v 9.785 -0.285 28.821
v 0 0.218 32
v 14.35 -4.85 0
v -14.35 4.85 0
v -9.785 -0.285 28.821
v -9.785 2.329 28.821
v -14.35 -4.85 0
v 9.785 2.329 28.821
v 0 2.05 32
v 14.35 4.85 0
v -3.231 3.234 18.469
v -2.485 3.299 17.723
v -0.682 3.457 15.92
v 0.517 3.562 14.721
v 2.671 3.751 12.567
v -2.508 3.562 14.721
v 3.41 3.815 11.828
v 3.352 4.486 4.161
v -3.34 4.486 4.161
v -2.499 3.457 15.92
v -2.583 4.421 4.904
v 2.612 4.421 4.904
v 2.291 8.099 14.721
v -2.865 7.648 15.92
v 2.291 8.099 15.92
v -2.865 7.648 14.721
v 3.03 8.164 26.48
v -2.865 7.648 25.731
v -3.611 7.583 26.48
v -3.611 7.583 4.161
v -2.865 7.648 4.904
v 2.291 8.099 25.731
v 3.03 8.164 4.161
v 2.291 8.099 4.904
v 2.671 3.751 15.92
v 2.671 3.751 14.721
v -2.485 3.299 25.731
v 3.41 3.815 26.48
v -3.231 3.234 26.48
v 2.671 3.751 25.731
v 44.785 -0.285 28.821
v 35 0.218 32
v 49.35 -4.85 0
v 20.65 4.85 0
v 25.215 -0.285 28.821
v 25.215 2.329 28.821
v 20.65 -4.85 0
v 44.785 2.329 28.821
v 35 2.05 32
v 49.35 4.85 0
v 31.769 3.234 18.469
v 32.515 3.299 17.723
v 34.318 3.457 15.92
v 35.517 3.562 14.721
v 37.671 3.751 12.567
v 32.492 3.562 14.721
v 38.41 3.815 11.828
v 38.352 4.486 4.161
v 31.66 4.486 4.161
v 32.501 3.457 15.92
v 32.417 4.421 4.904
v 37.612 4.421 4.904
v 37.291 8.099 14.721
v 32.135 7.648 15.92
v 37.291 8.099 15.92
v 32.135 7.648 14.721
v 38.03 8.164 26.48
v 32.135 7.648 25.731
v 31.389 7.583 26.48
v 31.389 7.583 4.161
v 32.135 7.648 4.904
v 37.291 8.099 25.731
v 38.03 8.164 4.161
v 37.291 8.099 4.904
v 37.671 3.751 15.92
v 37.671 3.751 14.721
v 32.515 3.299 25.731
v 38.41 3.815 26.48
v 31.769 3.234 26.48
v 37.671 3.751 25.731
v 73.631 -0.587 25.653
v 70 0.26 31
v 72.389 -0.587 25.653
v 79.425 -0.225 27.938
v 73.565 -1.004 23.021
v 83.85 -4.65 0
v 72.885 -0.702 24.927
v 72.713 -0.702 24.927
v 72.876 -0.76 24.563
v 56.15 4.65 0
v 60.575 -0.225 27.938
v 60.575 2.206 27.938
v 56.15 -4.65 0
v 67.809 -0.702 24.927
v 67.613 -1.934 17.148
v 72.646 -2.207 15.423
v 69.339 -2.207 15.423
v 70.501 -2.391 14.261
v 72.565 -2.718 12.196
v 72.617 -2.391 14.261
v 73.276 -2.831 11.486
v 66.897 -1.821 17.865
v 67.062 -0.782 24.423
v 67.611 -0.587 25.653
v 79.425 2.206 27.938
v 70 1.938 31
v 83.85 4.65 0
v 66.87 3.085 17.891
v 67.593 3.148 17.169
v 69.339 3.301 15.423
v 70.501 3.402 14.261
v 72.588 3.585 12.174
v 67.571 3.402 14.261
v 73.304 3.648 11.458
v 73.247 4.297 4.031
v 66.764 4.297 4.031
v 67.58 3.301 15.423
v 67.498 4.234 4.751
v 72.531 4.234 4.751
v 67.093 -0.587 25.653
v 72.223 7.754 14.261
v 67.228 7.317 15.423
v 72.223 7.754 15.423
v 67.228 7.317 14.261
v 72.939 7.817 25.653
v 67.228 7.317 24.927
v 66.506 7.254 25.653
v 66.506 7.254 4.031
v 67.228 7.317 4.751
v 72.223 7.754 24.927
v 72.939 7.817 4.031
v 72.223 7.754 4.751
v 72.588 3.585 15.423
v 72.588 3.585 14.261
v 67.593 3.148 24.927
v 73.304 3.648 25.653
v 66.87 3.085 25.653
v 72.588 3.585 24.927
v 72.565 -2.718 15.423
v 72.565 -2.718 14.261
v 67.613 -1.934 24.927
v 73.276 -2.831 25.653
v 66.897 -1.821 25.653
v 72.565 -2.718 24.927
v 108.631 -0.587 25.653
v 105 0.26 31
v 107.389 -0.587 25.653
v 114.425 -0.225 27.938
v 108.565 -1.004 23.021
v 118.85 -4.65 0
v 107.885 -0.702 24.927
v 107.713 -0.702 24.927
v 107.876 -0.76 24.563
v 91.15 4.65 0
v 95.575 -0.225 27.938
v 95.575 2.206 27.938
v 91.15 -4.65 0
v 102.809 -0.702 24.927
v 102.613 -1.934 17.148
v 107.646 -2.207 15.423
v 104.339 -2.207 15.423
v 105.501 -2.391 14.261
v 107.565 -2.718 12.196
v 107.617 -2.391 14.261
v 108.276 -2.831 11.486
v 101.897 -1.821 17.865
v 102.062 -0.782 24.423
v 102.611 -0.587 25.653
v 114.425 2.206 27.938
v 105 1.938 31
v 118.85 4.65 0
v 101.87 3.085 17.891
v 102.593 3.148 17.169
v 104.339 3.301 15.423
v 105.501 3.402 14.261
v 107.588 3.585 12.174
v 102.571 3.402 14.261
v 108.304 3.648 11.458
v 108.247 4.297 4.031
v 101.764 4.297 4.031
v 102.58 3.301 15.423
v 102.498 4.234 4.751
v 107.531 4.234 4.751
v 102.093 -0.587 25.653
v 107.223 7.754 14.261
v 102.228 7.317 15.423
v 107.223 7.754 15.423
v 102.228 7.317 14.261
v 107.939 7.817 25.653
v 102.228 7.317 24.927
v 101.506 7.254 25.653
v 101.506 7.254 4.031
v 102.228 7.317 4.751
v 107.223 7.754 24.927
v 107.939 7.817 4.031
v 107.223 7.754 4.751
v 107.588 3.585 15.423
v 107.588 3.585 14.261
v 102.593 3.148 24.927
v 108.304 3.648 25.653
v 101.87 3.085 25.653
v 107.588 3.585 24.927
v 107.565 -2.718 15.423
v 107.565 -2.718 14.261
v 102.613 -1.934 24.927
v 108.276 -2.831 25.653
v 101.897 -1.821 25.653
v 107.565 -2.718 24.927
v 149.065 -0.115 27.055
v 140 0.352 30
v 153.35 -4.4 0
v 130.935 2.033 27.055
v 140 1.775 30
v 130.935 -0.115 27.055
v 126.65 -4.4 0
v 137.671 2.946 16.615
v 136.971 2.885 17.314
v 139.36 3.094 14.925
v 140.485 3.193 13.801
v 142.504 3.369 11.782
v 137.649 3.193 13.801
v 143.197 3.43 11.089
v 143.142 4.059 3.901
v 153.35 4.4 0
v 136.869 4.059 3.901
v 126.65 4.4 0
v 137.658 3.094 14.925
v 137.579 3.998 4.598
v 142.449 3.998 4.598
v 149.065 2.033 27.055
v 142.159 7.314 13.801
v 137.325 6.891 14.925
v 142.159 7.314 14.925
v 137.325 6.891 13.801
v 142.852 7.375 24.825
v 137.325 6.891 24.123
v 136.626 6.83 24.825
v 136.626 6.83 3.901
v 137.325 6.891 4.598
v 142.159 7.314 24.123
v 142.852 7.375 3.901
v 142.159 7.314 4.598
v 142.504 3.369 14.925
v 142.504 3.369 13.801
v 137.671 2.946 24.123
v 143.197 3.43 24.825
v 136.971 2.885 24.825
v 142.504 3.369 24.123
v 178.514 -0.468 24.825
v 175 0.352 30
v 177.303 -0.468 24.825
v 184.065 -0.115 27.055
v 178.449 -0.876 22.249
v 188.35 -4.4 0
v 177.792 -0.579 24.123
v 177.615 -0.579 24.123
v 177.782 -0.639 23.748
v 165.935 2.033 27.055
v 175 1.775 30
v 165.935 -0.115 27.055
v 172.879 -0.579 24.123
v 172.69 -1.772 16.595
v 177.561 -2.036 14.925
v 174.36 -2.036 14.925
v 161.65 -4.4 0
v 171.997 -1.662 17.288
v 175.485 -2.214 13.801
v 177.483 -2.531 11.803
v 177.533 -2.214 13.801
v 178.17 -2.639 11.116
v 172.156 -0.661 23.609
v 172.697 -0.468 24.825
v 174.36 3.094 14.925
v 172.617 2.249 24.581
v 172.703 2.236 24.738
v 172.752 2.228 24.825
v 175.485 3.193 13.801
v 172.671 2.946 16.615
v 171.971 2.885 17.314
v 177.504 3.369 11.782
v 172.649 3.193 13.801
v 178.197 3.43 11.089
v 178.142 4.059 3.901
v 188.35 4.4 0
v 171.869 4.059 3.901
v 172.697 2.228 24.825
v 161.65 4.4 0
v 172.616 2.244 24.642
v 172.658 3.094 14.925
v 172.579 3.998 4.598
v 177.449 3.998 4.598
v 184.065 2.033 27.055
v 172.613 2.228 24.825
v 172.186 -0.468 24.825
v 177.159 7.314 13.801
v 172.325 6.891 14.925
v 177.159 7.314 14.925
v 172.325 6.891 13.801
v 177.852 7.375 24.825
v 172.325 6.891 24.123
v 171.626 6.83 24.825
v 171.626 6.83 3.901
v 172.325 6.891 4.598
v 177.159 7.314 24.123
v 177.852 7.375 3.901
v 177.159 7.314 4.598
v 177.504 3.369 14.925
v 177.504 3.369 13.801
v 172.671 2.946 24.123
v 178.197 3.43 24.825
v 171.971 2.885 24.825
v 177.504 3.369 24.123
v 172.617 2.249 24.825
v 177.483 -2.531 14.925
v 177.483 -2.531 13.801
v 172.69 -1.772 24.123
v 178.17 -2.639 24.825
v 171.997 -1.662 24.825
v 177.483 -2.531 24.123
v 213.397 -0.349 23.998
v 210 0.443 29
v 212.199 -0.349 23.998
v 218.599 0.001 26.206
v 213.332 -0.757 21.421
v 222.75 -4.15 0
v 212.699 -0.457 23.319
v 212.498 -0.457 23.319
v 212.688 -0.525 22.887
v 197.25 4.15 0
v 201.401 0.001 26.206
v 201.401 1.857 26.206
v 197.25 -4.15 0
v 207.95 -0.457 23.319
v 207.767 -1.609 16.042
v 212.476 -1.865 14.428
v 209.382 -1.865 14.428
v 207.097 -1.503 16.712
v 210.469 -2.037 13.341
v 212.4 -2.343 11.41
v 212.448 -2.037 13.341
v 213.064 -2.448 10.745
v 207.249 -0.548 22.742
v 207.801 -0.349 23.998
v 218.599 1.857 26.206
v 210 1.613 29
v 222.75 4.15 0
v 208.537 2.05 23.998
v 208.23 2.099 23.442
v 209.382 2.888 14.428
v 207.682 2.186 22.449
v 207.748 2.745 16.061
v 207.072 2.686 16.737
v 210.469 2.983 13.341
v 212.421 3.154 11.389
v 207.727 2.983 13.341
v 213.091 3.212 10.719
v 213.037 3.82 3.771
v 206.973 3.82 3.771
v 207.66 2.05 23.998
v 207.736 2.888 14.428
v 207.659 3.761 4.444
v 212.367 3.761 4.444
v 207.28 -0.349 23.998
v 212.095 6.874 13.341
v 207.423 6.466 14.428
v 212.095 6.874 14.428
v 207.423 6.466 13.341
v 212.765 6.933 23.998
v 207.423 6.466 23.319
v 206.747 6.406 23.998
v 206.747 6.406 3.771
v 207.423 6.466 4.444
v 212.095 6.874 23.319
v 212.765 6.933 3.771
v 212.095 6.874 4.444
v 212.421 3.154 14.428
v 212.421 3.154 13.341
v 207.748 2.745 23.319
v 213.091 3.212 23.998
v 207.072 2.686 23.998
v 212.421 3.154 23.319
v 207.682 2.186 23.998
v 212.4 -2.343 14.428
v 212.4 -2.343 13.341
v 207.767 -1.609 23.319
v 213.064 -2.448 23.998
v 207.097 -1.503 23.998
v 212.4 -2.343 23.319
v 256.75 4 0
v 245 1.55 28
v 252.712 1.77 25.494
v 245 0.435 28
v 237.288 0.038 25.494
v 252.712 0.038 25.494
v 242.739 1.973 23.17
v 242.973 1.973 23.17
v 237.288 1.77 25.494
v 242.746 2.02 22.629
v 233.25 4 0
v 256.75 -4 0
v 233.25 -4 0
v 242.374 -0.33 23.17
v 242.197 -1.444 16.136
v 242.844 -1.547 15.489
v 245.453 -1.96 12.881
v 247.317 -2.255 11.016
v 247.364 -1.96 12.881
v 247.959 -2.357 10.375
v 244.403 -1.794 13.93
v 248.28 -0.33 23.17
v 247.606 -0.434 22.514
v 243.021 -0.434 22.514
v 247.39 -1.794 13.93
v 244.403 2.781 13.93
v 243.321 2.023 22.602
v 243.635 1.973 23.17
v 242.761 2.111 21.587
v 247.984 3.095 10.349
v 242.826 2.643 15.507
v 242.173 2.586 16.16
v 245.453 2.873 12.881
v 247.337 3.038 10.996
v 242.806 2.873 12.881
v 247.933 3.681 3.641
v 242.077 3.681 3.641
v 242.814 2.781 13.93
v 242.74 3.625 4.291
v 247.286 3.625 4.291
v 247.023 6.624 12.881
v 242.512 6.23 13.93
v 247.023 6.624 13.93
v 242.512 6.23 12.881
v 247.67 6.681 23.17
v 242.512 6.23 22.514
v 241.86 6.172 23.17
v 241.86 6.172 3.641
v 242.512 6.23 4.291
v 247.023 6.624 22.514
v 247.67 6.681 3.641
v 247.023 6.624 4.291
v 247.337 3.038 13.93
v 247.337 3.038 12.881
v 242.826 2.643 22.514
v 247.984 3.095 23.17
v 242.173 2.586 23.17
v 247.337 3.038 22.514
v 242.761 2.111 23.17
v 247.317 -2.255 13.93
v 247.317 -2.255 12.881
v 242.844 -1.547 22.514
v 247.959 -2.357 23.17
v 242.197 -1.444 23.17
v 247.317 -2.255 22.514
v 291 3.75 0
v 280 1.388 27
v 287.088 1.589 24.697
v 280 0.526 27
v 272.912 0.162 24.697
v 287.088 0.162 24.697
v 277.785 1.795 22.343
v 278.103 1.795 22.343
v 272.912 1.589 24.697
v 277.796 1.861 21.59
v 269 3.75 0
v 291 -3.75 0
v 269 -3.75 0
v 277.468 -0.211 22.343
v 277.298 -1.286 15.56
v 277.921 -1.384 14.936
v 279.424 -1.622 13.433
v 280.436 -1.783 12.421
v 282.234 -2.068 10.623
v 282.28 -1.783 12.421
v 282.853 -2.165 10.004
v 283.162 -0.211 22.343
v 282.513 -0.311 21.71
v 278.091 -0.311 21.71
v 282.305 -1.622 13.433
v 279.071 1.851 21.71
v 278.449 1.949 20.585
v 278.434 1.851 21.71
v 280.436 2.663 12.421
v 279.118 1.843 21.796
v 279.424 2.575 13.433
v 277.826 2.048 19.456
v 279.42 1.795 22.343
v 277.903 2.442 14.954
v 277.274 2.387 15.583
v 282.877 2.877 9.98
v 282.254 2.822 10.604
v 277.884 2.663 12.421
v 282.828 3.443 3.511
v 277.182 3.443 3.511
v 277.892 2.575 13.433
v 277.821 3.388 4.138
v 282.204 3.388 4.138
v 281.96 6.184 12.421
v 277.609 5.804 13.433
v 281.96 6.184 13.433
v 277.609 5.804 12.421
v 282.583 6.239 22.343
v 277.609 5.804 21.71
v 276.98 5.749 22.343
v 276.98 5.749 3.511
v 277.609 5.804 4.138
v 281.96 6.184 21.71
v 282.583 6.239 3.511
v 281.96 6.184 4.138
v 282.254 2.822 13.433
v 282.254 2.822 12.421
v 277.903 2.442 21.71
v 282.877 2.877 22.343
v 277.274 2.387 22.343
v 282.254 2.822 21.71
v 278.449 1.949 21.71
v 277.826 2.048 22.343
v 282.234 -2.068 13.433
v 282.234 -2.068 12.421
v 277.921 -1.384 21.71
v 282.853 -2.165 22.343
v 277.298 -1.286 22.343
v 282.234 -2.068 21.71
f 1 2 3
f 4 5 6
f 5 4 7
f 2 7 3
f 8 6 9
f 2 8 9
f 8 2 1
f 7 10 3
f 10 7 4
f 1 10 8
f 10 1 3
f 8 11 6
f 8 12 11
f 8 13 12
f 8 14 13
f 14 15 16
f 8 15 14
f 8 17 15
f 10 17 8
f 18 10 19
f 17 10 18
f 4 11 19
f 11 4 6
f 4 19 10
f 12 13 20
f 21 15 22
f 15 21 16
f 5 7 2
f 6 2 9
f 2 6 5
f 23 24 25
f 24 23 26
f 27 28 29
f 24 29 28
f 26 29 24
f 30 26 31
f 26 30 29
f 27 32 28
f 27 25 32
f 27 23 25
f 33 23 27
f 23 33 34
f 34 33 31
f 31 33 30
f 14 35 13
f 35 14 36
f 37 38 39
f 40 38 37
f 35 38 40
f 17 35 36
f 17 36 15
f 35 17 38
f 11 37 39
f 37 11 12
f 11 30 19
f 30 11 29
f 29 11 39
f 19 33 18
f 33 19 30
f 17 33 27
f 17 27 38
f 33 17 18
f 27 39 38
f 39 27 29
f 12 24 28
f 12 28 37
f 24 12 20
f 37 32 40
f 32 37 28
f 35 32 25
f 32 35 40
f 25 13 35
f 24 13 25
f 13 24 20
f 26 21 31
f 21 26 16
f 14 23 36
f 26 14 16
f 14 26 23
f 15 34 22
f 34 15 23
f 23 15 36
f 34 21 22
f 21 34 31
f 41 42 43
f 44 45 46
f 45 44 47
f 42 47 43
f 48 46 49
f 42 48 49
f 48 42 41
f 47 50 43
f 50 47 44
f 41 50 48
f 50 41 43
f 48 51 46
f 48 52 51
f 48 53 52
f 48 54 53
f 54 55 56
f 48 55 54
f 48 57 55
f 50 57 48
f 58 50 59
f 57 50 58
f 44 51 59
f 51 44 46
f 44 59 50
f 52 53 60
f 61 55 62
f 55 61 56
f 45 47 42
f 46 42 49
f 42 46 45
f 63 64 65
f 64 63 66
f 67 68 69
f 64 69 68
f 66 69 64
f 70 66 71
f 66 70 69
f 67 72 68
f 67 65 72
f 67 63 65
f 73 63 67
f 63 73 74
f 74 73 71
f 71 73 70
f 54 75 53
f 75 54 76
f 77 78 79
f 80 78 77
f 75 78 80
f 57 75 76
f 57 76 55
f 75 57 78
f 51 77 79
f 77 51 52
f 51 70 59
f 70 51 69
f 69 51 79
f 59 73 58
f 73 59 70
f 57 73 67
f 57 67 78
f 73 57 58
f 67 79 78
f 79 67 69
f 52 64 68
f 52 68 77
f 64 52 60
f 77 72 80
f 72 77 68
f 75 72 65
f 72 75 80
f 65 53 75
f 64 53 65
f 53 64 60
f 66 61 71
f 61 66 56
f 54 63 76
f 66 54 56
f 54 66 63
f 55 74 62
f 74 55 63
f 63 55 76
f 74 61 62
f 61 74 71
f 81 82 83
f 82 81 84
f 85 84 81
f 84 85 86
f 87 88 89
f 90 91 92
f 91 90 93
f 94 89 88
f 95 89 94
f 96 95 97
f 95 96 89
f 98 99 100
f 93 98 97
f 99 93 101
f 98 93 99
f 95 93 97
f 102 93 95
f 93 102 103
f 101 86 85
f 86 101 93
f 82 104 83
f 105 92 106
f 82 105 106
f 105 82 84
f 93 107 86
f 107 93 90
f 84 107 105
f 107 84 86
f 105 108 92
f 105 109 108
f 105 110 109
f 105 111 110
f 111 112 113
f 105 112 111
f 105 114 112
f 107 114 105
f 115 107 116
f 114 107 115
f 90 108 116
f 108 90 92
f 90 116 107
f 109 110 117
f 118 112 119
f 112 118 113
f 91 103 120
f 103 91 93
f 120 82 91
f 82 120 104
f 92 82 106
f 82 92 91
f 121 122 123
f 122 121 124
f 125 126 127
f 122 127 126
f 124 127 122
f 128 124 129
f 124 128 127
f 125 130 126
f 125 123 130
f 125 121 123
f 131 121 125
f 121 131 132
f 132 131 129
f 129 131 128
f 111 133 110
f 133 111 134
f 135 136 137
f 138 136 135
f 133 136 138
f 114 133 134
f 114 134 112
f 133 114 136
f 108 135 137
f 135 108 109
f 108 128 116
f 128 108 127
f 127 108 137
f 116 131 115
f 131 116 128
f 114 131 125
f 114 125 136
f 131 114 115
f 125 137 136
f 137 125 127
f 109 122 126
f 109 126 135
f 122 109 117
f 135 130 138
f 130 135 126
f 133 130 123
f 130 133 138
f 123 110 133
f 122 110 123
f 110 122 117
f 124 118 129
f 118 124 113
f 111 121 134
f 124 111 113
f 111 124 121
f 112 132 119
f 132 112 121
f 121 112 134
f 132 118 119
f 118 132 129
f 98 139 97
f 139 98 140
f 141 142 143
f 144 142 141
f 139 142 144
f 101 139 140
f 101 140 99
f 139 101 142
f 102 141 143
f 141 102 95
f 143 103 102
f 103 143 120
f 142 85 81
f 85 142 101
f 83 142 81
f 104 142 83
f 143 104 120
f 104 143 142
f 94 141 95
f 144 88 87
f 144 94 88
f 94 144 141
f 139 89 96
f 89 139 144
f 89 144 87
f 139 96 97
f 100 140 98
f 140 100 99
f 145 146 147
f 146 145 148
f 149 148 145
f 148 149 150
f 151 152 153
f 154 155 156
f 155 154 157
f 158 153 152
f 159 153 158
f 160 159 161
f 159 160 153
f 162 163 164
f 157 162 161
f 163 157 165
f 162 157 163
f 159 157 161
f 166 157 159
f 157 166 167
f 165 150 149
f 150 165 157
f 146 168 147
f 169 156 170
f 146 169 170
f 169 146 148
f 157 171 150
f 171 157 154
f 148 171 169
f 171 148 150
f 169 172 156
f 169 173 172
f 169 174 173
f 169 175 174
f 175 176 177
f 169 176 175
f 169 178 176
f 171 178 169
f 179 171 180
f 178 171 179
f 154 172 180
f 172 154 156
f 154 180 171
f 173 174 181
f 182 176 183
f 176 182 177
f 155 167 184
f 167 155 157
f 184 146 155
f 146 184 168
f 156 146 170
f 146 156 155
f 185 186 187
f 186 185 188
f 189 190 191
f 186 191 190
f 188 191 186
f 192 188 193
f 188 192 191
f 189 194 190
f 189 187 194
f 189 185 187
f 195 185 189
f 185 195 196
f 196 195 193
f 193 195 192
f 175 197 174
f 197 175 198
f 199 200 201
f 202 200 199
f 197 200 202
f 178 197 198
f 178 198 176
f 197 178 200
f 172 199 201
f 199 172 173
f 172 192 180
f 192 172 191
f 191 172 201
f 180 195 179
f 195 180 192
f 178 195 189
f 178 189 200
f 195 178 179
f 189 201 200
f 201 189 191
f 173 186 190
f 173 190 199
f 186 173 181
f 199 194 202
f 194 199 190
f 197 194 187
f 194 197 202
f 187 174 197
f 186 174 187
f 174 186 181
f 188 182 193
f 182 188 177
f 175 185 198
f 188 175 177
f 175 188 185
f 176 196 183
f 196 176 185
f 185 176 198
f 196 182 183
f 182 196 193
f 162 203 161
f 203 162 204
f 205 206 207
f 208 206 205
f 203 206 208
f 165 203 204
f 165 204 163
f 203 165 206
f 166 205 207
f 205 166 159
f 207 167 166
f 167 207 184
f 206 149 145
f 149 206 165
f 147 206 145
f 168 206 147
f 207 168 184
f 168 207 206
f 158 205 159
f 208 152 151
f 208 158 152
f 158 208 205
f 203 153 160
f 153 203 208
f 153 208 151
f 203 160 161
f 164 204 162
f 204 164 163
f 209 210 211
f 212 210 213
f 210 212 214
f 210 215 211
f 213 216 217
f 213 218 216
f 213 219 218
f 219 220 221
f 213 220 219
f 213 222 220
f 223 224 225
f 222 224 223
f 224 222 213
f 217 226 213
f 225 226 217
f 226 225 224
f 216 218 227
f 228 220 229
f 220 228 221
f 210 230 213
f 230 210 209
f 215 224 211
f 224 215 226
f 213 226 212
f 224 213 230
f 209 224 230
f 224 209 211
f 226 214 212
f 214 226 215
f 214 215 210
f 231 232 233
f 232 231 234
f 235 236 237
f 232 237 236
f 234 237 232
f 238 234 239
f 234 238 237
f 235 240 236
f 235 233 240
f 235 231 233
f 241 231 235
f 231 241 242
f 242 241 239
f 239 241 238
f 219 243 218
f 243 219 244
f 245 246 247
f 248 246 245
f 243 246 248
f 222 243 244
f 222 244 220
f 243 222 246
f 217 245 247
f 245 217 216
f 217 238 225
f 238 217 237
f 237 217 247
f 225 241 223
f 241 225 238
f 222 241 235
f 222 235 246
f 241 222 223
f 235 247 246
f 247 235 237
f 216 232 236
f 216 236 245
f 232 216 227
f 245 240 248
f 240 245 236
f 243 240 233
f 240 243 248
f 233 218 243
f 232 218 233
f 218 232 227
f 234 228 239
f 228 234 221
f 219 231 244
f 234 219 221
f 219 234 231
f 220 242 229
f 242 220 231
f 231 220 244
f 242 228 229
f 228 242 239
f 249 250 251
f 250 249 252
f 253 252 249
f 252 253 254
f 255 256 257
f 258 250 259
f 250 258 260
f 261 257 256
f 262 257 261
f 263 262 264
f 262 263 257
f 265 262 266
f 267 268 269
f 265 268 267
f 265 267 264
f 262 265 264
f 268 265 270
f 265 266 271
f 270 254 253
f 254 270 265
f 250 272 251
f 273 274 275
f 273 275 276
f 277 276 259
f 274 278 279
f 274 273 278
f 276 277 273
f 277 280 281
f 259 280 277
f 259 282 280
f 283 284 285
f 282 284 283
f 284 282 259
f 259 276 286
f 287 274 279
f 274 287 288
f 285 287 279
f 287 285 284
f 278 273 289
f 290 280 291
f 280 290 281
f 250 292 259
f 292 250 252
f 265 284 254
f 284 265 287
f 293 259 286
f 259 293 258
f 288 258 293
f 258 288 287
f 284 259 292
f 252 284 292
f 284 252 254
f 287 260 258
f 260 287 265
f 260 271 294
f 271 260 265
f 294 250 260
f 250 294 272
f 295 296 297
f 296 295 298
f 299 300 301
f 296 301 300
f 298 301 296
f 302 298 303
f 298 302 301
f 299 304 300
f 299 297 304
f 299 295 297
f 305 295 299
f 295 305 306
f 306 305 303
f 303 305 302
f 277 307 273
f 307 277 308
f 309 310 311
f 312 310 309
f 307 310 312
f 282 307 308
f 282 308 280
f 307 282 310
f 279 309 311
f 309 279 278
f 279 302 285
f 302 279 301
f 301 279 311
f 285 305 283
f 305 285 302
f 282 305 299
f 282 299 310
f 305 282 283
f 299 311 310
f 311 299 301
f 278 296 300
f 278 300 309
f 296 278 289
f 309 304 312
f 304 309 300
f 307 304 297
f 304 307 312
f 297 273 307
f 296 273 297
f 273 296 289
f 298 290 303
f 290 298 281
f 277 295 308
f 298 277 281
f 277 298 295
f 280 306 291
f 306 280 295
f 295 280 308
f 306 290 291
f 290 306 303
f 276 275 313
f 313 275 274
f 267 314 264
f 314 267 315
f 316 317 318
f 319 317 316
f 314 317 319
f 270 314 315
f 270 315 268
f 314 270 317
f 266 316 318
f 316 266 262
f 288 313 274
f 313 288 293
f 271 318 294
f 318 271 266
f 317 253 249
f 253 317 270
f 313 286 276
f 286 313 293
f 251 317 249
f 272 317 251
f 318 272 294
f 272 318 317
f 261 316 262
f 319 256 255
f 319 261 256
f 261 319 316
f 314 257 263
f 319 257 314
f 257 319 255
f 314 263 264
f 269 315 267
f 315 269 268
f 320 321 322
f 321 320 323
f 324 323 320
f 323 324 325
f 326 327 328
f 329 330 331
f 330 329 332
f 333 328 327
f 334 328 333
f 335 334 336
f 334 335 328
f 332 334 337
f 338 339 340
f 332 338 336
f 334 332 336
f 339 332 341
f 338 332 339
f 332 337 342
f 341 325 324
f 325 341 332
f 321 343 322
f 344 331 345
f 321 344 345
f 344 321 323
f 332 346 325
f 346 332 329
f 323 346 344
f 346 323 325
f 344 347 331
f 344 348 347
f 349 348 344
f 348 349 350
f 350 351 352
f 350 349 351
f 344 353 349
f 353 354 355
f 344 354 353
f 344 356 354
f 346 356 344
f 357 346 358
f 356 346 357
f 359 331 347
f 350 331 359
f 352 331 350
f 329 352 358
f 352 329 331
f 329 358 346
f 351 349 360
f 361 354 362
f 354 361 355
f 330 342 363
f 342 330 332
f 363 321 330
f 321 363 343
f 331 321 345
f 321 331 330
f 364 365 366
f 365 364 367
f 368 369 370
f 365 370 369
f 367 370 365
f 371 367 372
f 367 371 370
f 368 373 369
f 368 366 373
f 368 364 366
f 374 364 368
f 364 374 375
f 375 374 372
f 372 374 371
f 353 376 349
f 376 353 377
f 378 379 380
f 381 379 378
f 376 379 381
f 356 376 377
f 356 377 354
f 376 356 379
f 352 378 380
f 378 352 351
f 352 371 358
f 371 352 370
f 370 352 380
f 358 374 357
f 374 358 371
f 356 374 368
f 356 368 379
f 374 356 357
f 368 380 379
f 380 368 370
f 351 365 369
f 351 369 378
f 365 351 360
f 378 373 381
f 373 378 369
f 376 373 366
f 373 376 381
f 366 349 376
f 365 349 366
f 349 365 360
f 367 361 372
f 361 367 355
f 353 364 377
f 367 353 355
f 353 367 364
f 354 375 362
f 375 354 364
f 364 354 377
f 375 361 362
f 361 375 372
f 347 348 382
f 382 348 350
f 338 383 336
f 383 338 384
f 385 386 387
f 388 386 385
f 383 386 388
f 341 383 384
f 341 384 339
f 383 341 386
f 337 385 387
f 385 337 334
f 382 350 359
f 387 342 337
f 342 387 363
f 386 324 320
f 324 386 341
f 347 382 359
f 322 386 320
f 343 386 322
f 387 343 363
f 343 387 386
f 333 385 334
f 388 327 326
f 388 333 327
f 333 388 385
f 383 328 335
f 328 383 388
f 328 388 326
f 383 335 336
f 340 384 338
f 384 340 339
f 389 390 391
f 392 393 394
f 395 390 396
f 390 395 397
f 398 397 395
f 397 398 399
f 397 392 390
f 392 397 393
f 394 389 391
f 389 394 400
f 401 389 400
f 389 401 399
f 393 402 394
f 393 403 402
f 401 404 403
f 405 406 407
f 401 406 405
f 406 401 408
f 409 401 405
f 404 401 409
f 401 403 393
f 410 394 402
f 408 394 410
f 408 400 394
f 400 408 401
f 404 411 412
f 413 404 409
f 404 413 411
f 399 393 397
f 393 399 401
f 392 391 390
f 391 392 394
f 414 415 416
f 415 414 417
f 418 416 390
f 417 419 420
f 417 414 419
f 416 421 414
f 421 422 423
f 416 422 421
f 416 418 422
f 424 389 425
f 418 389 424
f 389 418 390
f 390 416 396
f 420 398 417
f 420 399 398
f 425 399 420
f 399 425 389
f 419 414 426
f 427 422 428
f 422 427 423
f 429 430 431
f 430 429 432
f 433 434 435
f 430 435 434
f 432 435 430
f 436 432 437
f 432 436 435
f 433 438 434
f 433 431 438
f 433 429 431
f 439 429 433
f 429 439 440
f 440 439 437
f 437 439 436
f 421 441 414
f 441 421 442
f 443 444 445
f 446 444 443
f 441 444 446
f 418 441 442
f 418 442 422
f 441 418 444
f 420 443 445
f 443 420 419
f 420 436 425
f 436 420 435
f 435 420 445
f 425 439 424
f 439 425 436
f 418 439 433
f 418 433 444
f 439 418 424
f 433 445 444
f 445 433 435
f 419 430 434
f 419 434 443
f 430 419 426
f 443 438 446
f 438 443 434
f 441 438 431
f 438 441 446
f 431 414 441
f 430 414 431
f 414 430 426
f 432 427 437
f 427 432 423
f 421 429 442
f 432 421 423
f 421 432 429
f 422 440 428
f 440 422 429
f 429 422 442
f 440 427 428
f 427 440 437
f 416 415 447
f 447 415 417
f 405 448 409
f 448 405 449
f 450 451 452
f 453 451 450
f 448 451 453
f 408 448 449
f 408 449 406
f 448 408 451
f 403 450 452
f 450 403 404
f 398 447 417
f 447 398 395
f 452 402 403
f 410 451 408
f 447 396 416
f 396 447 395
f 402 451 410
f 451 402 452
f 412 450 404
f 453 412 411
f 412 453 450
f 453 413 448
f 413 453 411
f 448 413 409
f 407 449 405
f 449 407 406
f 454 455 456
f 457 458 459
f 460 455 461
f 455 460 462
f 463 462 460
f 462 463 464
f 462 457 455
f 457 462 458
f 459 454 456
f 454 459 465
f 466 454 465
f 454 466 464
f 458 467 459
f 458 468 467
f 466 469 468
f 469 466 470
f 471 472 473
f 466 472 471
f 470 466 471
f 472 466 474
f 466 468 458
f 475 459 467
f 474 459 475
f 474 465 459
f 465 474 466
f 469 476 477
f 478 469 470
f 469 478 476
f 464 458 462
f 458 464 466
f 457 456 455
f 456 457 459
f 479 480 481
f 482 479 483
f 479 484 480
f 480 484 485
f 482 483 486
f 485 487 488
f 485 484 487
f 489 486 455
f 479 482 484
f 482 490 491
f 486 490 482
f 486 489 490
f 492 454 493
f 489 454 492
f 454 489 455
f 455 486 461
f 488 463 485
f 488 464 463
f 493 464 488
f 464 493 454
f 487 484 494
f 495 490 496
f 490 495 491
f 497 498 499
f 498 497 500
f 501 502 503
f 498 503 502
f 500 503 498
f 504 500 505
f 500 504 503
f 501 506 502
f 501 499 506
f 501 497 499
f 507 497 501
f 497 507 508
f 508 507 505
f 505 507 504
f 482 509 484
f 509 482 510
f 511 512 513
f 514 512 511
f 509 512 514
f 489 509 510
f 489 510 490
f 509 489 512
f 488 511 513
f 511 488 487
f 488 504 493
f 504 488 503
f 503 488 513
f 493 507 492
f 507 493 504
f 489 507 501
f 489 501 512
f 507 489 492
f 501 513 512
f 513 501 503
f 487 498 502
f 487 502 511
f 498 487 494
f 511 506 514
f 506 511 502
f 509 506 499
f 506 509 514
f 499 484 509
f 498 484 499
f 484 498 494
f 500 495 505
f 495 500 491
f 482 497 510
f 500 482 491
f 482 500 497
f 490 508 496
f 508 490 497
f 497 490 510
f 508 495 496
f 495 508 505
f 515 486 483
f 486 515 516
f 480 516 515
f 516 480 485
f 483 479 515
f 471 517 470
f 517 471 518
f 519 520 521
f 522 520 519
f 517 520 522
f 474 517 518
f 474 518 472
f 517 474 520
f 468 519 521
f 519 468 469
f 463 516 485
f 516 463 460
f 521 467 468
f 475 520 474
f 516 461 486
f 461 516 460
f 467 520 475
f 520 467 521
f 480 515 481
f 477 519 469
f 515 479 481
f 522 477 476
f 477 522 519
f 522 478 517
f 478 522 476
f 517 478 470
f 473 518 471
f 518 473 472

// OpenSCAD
// Gemini-generated OpenSCAD script for Shogi Pieces
//
// ======== HOW TO USE FOR 3D PRINTING ========
// This script generates separate parts for multi-material printing.
// Your 3D slicer (e.g., PrusaSlicer, Bambu Studio, Cura) will combine the parts.
//
// --- For Multi-Color Printing ---
// 1. Select "Piece Body (Solid)" from `part_to_render` and export as STL/3MF.
// 2. Select "Unpromoted Text (Black)" and export as a separate file.
// 3. Select "Promoted Text (Red)" and export as a separate file.
// 4. In your slicer, load all parts. They may appear separated.
// 5. Select all parts and use the "Assemble" or "Merge" command. They will snap into place.
// 6. Assign your main filament (e.g., wood) to the body and other colors to the text parts.
//
// --- For Single-Color Printing (with recessed text) ---
// 1. Select "Piece Body (Solid)" and export.
// 2. Select "Unpromoted Text (Black)" and export.
// 3. Select "Promoted Text (Red)" and export.
// 4. In your slicer, load all parts and assemble them.
// 5. Select the two text parts and mark them as "Negative Volume" or "Cutter".
// 6. This will subtract the text from the body, creating perfect recesses.
//
// =================================================

// --- Parameters ---
piece_to_generate = "All"; // ["All", "Osho", "Gyokusho", "Hisha", "Kakugyo", "Kinsho", "Ginsho", "Keima", "Kyosha", "Fuhyo"]

// --- Customization ---
part_to_render = "Assembly (Preview)"; // ["Assembly (Preview)", "Piece Body (Solid)", "Unpromoted Text (Black)", "Promoted Text (Red)"]
text_vertical_adjust = 0; // [-5:0.1:5]
font_name = "Noto Sans JP";

// --- Data ---
PIECE_DATA = [
  ["Osho",32.0,28.7,9.7],["Gyokusho",32.0,28.7,9.7],["Hisha",31.0,27.7,9.3],["Kakugyo",31.0,27.7,9.3],
  ["Kinsho",30.0,26.7,8.8],["Ginsho",30.0,26.7,8.8],["Keima",29.0,25.5,8.3],["Kyosha",28.0,23.5,8.0],
  ["Fuhyo",27.0,22.0,7.5]
];
KANJI_DATA = [
  ["Osho","王將",""],["Gyokusho","玉將",""],["Hisha","飛車","龍王"],["Kakugyo","角行","龍馬"],["Kinsho","金將",""],
  ["Ginsho","銀將","成銀"],["Keima","桂馬","成桂"],["Kyosha","香車","成香"],["Fuhyo",    "歩兵", "と金"]
];
ANGLE_FRONT_BOTTOM=81; ANGLE_FRONT_SIDE=117; ANGLE_SIDE_1=81; ANGLE_SIDE_2=85;

// --- Main Logic ---

// Function to find the index of a piece by name using a list comprehension.
// This is the robust way to search in OpenSCAD, avoiding variable scope issues.
function find_piece_index(name) = [
  for (i = [0:len(PIECE_DATA)-1]) if (PIECE_DATA[i][0] == name) i
];

if (piece_to_generate == "All") {
  // If "All" is selected, loop through and render every piece.
  spacing = 35;
  for (i = [0 : len(PIECE_DATA) - 1]) {
    translate([i * spacing, 0, 0]) {
      shogi_piece_from_index(i);
    }
  }
} else {
  // If a single piece is selected, find its index using the function.
  indices = find_piece_index(piece_to_generate);
  
  if (len(indices) > 0) {
    // If found, render the piece at the first matching index.
    shogi_piece_from_index(indices[0]);
  } else {
    // If not found, show an error.
    echo("Error: Piece not found.");
  }
}

// --- Modules & Functions ---
module shogi_piece_from_index(index) {
  d=PIECE_DATA[index]; k=KANJI_DATA[index];
  shogi_piece(H=d[1],W=d[2],T=d[3],kanji_unpromoted=k[1],kanji_promoted=k[2]);
}

module shogi_piece(W, H, T, kanji_unpromoted, kanji_promoted) {
  // This internal module creates the text geometry, rotated, at the origin.
  module text_geometry_at_origin(is_promoted) {
    txt = is_promoted ? kanji_promoted : kanji_unpromoted;
    if (txt != "") {
      text_depth = T * 0.45;
      face_angle = is_promoted ? ANGLE_SIDE_1 : ANGLE_SIDE_2;
      rotate_angle = 90 - face_angle;
      direction = is_promoted ? -1 : 1;
      
      // Corrected rotation:
      // 1. Rotate 90 around X to make text stand upright (from XY to XZ plane).
      // 2. Rotate `direction * rotate_angle` around Y to tilt text parallel to the face.
      rotate([90, 0, 0]) { // Make text upright
        rotate([0, direction * rotate_angle, 0]) { // Tilt to match face angle
          // Extrude from z=0 down to z=-text_depth in the rotated coordinate system.
          translate([0, 0, -text_depth]) {
            linear_extrude(height = text_depth) {
              // --- Vertical Text and Sizing Logic ---
              if (len(txt) == 2) {
                size = H * 0.3; spacing = size * 0.55;
                translate([0,spacing,0]) text(str(txt[0]),size=size,font=font_name,halign="center",valign="center");
                translate([0,-spacing,0]) text(str(txt[1]),size=size,font=font_name,halign="center",valign="center");
              } else {
                size = H * 0.35;
                text(txt,size=size,font=font_name,halign="center",valign="center");
              }
            }
          }
        }
      }
    }
  }

  // Calculate the final [x,y,z] position for the text objects.
  z_pos = (H / 2.1) + text_vertical_adjust;
  y_front = z_pos*(-1/tan(ANGLE_SIDE_2))+T/2;
  y_back = z_pos*(1/tan(ANGLE_SIDE_1))-T/2;
  pos_front = [0, y_front, z_pos];
  pos_back = [0, y_back, z_pos];

  // Render the selected part.
  if (part_to_render == "Assembly (Preview)") {
    // Show the solid body with the text parts overlapping.
    // Use transparency to see how they fit.
    color("goldenrod", 0.5) piece_body(W, H, T);
    color("black") translate(pos_front) text_geometry_at_origin(false);
    color("red") translate(pos_back) text_geometry_at_origin(true);
  } else if (part_to_render == "Piece Body (Solid)") {
    piece_body(W, H, T);
  } else if (part_to_render == "Unpromoted Text (Black)") {
    translate(pos_front) text_geometry_at_origin(false);
  } else if (part_to_render == "Promoted Text (Red)") {
    translate(pos_back) text_geometry_at_origin(true);
  } else if (part_to_render == "Piece Body with Recesses") {
    // This is for preview only and may fail to render due to CGAL errors.
    // For printing, export the solid body and text parts separately.
    difference() {
        piece_body(W,H,T);
        translate(pos_front) text_geometry_at_origin(is_promoted = false);
        translate(pos_back) text_geometry_at_origin(is_promoted = true);
    }
  }
}

// Generates the solid outer body of the shogi piece using a polyhedron.
// This method is robust and creates a clean, manifold mesh suitable for 3D printing.
module piece_body(W, H, T) {
  // 1. Get the 5 points of the 2D front pentagon profile.
  p_pts = get_front_pentagon_points(W, H);

  // 2. Define the Y-coordinates for the front and back faces at different heights.
  //    The thickness profile is a trapezoid, so the Y position is a linear
  //    function of the Z-height.
  function y_pos(z, is_promoted_face) = is_promoted_face
      ? z * (1 / tan(ANGLE_SIDE_1)) - T / 2  // Back face
      : z * (-1 / tan(ANGLE_SIDE_2)) + T / 2; // Front face

  // 3. Create the 10 vertices of the 3D shape.
  //    v_f_* are front vertices, v_b_* are back vertices.
  points = [
    // Back vertices (indices 0-4)
    for (p = p_pts) [p[0], y_pos(p[1], true), p[1]],
    // Front vertices (indices 5-9)
    for (p = p_pts) [p[0], y_pos(p[1], false), p[1]]
  ];

  // 4. Define the faces connecting the vertices.
  //    Each face is a list of vertex indices. Order matters for correct orientation.
  faces = [
    [0, 4, 3, 2, 1],      // Back face (reversed winding order)
    [5, 6, 7, 8, 9],      // Front face
    [0, 1, 6, 5],         // Bottom face
    [1, 2, 7, 6],         // Right side face
    [2, 3, 8, 7],         // Top-right face
    [3, 4, 9, 8],         // Top-left face
    [4, 0, 5, 9]          // Left side face
  ];

  // 5. Create the polyhedron.
  polyhedron(points = points, faces = faces);
}
function get_front_pentagon_points(W,H)=let(h1=180-ANGLE_FRONT_BOTTOM,h2=h1+(180-ANGLE_FRONT_SIDE),
a=cos(h1),b=cos(h2),c=-W/2,d=sin(h1),e=sin(h2),f=H,det=a*e-b*d,L1=(c*e-b*f)/det,L2=(a*f-c*d)/det,
p_br=[W/2,0],p_tr_x=p_br[0]+L1*cos(h1),p_tr_z=p_br[1]+L1*sin(h1),p_bl=[-W/2,0],
p_tr=[p_tr_x,p_tr_z],p_top=[0,H],p_tl=[-p_tr_x,p_tr_z])[p_bl,p_br,p_tr,p_top,p_tl];

function get_side_trapezoid_points(H,T)=let(y_b=-T/2+H/tan(ANGLE_SIDE_1),y_f=T/2-H/tan(ANGLE_SIDE_2),
p_bl=[-T/2,0],p_br=[T/2,0],p_tr=[y_f,H],p_tl=[y_b,H])[p_bl,p_br,p_tr,p_tl];
